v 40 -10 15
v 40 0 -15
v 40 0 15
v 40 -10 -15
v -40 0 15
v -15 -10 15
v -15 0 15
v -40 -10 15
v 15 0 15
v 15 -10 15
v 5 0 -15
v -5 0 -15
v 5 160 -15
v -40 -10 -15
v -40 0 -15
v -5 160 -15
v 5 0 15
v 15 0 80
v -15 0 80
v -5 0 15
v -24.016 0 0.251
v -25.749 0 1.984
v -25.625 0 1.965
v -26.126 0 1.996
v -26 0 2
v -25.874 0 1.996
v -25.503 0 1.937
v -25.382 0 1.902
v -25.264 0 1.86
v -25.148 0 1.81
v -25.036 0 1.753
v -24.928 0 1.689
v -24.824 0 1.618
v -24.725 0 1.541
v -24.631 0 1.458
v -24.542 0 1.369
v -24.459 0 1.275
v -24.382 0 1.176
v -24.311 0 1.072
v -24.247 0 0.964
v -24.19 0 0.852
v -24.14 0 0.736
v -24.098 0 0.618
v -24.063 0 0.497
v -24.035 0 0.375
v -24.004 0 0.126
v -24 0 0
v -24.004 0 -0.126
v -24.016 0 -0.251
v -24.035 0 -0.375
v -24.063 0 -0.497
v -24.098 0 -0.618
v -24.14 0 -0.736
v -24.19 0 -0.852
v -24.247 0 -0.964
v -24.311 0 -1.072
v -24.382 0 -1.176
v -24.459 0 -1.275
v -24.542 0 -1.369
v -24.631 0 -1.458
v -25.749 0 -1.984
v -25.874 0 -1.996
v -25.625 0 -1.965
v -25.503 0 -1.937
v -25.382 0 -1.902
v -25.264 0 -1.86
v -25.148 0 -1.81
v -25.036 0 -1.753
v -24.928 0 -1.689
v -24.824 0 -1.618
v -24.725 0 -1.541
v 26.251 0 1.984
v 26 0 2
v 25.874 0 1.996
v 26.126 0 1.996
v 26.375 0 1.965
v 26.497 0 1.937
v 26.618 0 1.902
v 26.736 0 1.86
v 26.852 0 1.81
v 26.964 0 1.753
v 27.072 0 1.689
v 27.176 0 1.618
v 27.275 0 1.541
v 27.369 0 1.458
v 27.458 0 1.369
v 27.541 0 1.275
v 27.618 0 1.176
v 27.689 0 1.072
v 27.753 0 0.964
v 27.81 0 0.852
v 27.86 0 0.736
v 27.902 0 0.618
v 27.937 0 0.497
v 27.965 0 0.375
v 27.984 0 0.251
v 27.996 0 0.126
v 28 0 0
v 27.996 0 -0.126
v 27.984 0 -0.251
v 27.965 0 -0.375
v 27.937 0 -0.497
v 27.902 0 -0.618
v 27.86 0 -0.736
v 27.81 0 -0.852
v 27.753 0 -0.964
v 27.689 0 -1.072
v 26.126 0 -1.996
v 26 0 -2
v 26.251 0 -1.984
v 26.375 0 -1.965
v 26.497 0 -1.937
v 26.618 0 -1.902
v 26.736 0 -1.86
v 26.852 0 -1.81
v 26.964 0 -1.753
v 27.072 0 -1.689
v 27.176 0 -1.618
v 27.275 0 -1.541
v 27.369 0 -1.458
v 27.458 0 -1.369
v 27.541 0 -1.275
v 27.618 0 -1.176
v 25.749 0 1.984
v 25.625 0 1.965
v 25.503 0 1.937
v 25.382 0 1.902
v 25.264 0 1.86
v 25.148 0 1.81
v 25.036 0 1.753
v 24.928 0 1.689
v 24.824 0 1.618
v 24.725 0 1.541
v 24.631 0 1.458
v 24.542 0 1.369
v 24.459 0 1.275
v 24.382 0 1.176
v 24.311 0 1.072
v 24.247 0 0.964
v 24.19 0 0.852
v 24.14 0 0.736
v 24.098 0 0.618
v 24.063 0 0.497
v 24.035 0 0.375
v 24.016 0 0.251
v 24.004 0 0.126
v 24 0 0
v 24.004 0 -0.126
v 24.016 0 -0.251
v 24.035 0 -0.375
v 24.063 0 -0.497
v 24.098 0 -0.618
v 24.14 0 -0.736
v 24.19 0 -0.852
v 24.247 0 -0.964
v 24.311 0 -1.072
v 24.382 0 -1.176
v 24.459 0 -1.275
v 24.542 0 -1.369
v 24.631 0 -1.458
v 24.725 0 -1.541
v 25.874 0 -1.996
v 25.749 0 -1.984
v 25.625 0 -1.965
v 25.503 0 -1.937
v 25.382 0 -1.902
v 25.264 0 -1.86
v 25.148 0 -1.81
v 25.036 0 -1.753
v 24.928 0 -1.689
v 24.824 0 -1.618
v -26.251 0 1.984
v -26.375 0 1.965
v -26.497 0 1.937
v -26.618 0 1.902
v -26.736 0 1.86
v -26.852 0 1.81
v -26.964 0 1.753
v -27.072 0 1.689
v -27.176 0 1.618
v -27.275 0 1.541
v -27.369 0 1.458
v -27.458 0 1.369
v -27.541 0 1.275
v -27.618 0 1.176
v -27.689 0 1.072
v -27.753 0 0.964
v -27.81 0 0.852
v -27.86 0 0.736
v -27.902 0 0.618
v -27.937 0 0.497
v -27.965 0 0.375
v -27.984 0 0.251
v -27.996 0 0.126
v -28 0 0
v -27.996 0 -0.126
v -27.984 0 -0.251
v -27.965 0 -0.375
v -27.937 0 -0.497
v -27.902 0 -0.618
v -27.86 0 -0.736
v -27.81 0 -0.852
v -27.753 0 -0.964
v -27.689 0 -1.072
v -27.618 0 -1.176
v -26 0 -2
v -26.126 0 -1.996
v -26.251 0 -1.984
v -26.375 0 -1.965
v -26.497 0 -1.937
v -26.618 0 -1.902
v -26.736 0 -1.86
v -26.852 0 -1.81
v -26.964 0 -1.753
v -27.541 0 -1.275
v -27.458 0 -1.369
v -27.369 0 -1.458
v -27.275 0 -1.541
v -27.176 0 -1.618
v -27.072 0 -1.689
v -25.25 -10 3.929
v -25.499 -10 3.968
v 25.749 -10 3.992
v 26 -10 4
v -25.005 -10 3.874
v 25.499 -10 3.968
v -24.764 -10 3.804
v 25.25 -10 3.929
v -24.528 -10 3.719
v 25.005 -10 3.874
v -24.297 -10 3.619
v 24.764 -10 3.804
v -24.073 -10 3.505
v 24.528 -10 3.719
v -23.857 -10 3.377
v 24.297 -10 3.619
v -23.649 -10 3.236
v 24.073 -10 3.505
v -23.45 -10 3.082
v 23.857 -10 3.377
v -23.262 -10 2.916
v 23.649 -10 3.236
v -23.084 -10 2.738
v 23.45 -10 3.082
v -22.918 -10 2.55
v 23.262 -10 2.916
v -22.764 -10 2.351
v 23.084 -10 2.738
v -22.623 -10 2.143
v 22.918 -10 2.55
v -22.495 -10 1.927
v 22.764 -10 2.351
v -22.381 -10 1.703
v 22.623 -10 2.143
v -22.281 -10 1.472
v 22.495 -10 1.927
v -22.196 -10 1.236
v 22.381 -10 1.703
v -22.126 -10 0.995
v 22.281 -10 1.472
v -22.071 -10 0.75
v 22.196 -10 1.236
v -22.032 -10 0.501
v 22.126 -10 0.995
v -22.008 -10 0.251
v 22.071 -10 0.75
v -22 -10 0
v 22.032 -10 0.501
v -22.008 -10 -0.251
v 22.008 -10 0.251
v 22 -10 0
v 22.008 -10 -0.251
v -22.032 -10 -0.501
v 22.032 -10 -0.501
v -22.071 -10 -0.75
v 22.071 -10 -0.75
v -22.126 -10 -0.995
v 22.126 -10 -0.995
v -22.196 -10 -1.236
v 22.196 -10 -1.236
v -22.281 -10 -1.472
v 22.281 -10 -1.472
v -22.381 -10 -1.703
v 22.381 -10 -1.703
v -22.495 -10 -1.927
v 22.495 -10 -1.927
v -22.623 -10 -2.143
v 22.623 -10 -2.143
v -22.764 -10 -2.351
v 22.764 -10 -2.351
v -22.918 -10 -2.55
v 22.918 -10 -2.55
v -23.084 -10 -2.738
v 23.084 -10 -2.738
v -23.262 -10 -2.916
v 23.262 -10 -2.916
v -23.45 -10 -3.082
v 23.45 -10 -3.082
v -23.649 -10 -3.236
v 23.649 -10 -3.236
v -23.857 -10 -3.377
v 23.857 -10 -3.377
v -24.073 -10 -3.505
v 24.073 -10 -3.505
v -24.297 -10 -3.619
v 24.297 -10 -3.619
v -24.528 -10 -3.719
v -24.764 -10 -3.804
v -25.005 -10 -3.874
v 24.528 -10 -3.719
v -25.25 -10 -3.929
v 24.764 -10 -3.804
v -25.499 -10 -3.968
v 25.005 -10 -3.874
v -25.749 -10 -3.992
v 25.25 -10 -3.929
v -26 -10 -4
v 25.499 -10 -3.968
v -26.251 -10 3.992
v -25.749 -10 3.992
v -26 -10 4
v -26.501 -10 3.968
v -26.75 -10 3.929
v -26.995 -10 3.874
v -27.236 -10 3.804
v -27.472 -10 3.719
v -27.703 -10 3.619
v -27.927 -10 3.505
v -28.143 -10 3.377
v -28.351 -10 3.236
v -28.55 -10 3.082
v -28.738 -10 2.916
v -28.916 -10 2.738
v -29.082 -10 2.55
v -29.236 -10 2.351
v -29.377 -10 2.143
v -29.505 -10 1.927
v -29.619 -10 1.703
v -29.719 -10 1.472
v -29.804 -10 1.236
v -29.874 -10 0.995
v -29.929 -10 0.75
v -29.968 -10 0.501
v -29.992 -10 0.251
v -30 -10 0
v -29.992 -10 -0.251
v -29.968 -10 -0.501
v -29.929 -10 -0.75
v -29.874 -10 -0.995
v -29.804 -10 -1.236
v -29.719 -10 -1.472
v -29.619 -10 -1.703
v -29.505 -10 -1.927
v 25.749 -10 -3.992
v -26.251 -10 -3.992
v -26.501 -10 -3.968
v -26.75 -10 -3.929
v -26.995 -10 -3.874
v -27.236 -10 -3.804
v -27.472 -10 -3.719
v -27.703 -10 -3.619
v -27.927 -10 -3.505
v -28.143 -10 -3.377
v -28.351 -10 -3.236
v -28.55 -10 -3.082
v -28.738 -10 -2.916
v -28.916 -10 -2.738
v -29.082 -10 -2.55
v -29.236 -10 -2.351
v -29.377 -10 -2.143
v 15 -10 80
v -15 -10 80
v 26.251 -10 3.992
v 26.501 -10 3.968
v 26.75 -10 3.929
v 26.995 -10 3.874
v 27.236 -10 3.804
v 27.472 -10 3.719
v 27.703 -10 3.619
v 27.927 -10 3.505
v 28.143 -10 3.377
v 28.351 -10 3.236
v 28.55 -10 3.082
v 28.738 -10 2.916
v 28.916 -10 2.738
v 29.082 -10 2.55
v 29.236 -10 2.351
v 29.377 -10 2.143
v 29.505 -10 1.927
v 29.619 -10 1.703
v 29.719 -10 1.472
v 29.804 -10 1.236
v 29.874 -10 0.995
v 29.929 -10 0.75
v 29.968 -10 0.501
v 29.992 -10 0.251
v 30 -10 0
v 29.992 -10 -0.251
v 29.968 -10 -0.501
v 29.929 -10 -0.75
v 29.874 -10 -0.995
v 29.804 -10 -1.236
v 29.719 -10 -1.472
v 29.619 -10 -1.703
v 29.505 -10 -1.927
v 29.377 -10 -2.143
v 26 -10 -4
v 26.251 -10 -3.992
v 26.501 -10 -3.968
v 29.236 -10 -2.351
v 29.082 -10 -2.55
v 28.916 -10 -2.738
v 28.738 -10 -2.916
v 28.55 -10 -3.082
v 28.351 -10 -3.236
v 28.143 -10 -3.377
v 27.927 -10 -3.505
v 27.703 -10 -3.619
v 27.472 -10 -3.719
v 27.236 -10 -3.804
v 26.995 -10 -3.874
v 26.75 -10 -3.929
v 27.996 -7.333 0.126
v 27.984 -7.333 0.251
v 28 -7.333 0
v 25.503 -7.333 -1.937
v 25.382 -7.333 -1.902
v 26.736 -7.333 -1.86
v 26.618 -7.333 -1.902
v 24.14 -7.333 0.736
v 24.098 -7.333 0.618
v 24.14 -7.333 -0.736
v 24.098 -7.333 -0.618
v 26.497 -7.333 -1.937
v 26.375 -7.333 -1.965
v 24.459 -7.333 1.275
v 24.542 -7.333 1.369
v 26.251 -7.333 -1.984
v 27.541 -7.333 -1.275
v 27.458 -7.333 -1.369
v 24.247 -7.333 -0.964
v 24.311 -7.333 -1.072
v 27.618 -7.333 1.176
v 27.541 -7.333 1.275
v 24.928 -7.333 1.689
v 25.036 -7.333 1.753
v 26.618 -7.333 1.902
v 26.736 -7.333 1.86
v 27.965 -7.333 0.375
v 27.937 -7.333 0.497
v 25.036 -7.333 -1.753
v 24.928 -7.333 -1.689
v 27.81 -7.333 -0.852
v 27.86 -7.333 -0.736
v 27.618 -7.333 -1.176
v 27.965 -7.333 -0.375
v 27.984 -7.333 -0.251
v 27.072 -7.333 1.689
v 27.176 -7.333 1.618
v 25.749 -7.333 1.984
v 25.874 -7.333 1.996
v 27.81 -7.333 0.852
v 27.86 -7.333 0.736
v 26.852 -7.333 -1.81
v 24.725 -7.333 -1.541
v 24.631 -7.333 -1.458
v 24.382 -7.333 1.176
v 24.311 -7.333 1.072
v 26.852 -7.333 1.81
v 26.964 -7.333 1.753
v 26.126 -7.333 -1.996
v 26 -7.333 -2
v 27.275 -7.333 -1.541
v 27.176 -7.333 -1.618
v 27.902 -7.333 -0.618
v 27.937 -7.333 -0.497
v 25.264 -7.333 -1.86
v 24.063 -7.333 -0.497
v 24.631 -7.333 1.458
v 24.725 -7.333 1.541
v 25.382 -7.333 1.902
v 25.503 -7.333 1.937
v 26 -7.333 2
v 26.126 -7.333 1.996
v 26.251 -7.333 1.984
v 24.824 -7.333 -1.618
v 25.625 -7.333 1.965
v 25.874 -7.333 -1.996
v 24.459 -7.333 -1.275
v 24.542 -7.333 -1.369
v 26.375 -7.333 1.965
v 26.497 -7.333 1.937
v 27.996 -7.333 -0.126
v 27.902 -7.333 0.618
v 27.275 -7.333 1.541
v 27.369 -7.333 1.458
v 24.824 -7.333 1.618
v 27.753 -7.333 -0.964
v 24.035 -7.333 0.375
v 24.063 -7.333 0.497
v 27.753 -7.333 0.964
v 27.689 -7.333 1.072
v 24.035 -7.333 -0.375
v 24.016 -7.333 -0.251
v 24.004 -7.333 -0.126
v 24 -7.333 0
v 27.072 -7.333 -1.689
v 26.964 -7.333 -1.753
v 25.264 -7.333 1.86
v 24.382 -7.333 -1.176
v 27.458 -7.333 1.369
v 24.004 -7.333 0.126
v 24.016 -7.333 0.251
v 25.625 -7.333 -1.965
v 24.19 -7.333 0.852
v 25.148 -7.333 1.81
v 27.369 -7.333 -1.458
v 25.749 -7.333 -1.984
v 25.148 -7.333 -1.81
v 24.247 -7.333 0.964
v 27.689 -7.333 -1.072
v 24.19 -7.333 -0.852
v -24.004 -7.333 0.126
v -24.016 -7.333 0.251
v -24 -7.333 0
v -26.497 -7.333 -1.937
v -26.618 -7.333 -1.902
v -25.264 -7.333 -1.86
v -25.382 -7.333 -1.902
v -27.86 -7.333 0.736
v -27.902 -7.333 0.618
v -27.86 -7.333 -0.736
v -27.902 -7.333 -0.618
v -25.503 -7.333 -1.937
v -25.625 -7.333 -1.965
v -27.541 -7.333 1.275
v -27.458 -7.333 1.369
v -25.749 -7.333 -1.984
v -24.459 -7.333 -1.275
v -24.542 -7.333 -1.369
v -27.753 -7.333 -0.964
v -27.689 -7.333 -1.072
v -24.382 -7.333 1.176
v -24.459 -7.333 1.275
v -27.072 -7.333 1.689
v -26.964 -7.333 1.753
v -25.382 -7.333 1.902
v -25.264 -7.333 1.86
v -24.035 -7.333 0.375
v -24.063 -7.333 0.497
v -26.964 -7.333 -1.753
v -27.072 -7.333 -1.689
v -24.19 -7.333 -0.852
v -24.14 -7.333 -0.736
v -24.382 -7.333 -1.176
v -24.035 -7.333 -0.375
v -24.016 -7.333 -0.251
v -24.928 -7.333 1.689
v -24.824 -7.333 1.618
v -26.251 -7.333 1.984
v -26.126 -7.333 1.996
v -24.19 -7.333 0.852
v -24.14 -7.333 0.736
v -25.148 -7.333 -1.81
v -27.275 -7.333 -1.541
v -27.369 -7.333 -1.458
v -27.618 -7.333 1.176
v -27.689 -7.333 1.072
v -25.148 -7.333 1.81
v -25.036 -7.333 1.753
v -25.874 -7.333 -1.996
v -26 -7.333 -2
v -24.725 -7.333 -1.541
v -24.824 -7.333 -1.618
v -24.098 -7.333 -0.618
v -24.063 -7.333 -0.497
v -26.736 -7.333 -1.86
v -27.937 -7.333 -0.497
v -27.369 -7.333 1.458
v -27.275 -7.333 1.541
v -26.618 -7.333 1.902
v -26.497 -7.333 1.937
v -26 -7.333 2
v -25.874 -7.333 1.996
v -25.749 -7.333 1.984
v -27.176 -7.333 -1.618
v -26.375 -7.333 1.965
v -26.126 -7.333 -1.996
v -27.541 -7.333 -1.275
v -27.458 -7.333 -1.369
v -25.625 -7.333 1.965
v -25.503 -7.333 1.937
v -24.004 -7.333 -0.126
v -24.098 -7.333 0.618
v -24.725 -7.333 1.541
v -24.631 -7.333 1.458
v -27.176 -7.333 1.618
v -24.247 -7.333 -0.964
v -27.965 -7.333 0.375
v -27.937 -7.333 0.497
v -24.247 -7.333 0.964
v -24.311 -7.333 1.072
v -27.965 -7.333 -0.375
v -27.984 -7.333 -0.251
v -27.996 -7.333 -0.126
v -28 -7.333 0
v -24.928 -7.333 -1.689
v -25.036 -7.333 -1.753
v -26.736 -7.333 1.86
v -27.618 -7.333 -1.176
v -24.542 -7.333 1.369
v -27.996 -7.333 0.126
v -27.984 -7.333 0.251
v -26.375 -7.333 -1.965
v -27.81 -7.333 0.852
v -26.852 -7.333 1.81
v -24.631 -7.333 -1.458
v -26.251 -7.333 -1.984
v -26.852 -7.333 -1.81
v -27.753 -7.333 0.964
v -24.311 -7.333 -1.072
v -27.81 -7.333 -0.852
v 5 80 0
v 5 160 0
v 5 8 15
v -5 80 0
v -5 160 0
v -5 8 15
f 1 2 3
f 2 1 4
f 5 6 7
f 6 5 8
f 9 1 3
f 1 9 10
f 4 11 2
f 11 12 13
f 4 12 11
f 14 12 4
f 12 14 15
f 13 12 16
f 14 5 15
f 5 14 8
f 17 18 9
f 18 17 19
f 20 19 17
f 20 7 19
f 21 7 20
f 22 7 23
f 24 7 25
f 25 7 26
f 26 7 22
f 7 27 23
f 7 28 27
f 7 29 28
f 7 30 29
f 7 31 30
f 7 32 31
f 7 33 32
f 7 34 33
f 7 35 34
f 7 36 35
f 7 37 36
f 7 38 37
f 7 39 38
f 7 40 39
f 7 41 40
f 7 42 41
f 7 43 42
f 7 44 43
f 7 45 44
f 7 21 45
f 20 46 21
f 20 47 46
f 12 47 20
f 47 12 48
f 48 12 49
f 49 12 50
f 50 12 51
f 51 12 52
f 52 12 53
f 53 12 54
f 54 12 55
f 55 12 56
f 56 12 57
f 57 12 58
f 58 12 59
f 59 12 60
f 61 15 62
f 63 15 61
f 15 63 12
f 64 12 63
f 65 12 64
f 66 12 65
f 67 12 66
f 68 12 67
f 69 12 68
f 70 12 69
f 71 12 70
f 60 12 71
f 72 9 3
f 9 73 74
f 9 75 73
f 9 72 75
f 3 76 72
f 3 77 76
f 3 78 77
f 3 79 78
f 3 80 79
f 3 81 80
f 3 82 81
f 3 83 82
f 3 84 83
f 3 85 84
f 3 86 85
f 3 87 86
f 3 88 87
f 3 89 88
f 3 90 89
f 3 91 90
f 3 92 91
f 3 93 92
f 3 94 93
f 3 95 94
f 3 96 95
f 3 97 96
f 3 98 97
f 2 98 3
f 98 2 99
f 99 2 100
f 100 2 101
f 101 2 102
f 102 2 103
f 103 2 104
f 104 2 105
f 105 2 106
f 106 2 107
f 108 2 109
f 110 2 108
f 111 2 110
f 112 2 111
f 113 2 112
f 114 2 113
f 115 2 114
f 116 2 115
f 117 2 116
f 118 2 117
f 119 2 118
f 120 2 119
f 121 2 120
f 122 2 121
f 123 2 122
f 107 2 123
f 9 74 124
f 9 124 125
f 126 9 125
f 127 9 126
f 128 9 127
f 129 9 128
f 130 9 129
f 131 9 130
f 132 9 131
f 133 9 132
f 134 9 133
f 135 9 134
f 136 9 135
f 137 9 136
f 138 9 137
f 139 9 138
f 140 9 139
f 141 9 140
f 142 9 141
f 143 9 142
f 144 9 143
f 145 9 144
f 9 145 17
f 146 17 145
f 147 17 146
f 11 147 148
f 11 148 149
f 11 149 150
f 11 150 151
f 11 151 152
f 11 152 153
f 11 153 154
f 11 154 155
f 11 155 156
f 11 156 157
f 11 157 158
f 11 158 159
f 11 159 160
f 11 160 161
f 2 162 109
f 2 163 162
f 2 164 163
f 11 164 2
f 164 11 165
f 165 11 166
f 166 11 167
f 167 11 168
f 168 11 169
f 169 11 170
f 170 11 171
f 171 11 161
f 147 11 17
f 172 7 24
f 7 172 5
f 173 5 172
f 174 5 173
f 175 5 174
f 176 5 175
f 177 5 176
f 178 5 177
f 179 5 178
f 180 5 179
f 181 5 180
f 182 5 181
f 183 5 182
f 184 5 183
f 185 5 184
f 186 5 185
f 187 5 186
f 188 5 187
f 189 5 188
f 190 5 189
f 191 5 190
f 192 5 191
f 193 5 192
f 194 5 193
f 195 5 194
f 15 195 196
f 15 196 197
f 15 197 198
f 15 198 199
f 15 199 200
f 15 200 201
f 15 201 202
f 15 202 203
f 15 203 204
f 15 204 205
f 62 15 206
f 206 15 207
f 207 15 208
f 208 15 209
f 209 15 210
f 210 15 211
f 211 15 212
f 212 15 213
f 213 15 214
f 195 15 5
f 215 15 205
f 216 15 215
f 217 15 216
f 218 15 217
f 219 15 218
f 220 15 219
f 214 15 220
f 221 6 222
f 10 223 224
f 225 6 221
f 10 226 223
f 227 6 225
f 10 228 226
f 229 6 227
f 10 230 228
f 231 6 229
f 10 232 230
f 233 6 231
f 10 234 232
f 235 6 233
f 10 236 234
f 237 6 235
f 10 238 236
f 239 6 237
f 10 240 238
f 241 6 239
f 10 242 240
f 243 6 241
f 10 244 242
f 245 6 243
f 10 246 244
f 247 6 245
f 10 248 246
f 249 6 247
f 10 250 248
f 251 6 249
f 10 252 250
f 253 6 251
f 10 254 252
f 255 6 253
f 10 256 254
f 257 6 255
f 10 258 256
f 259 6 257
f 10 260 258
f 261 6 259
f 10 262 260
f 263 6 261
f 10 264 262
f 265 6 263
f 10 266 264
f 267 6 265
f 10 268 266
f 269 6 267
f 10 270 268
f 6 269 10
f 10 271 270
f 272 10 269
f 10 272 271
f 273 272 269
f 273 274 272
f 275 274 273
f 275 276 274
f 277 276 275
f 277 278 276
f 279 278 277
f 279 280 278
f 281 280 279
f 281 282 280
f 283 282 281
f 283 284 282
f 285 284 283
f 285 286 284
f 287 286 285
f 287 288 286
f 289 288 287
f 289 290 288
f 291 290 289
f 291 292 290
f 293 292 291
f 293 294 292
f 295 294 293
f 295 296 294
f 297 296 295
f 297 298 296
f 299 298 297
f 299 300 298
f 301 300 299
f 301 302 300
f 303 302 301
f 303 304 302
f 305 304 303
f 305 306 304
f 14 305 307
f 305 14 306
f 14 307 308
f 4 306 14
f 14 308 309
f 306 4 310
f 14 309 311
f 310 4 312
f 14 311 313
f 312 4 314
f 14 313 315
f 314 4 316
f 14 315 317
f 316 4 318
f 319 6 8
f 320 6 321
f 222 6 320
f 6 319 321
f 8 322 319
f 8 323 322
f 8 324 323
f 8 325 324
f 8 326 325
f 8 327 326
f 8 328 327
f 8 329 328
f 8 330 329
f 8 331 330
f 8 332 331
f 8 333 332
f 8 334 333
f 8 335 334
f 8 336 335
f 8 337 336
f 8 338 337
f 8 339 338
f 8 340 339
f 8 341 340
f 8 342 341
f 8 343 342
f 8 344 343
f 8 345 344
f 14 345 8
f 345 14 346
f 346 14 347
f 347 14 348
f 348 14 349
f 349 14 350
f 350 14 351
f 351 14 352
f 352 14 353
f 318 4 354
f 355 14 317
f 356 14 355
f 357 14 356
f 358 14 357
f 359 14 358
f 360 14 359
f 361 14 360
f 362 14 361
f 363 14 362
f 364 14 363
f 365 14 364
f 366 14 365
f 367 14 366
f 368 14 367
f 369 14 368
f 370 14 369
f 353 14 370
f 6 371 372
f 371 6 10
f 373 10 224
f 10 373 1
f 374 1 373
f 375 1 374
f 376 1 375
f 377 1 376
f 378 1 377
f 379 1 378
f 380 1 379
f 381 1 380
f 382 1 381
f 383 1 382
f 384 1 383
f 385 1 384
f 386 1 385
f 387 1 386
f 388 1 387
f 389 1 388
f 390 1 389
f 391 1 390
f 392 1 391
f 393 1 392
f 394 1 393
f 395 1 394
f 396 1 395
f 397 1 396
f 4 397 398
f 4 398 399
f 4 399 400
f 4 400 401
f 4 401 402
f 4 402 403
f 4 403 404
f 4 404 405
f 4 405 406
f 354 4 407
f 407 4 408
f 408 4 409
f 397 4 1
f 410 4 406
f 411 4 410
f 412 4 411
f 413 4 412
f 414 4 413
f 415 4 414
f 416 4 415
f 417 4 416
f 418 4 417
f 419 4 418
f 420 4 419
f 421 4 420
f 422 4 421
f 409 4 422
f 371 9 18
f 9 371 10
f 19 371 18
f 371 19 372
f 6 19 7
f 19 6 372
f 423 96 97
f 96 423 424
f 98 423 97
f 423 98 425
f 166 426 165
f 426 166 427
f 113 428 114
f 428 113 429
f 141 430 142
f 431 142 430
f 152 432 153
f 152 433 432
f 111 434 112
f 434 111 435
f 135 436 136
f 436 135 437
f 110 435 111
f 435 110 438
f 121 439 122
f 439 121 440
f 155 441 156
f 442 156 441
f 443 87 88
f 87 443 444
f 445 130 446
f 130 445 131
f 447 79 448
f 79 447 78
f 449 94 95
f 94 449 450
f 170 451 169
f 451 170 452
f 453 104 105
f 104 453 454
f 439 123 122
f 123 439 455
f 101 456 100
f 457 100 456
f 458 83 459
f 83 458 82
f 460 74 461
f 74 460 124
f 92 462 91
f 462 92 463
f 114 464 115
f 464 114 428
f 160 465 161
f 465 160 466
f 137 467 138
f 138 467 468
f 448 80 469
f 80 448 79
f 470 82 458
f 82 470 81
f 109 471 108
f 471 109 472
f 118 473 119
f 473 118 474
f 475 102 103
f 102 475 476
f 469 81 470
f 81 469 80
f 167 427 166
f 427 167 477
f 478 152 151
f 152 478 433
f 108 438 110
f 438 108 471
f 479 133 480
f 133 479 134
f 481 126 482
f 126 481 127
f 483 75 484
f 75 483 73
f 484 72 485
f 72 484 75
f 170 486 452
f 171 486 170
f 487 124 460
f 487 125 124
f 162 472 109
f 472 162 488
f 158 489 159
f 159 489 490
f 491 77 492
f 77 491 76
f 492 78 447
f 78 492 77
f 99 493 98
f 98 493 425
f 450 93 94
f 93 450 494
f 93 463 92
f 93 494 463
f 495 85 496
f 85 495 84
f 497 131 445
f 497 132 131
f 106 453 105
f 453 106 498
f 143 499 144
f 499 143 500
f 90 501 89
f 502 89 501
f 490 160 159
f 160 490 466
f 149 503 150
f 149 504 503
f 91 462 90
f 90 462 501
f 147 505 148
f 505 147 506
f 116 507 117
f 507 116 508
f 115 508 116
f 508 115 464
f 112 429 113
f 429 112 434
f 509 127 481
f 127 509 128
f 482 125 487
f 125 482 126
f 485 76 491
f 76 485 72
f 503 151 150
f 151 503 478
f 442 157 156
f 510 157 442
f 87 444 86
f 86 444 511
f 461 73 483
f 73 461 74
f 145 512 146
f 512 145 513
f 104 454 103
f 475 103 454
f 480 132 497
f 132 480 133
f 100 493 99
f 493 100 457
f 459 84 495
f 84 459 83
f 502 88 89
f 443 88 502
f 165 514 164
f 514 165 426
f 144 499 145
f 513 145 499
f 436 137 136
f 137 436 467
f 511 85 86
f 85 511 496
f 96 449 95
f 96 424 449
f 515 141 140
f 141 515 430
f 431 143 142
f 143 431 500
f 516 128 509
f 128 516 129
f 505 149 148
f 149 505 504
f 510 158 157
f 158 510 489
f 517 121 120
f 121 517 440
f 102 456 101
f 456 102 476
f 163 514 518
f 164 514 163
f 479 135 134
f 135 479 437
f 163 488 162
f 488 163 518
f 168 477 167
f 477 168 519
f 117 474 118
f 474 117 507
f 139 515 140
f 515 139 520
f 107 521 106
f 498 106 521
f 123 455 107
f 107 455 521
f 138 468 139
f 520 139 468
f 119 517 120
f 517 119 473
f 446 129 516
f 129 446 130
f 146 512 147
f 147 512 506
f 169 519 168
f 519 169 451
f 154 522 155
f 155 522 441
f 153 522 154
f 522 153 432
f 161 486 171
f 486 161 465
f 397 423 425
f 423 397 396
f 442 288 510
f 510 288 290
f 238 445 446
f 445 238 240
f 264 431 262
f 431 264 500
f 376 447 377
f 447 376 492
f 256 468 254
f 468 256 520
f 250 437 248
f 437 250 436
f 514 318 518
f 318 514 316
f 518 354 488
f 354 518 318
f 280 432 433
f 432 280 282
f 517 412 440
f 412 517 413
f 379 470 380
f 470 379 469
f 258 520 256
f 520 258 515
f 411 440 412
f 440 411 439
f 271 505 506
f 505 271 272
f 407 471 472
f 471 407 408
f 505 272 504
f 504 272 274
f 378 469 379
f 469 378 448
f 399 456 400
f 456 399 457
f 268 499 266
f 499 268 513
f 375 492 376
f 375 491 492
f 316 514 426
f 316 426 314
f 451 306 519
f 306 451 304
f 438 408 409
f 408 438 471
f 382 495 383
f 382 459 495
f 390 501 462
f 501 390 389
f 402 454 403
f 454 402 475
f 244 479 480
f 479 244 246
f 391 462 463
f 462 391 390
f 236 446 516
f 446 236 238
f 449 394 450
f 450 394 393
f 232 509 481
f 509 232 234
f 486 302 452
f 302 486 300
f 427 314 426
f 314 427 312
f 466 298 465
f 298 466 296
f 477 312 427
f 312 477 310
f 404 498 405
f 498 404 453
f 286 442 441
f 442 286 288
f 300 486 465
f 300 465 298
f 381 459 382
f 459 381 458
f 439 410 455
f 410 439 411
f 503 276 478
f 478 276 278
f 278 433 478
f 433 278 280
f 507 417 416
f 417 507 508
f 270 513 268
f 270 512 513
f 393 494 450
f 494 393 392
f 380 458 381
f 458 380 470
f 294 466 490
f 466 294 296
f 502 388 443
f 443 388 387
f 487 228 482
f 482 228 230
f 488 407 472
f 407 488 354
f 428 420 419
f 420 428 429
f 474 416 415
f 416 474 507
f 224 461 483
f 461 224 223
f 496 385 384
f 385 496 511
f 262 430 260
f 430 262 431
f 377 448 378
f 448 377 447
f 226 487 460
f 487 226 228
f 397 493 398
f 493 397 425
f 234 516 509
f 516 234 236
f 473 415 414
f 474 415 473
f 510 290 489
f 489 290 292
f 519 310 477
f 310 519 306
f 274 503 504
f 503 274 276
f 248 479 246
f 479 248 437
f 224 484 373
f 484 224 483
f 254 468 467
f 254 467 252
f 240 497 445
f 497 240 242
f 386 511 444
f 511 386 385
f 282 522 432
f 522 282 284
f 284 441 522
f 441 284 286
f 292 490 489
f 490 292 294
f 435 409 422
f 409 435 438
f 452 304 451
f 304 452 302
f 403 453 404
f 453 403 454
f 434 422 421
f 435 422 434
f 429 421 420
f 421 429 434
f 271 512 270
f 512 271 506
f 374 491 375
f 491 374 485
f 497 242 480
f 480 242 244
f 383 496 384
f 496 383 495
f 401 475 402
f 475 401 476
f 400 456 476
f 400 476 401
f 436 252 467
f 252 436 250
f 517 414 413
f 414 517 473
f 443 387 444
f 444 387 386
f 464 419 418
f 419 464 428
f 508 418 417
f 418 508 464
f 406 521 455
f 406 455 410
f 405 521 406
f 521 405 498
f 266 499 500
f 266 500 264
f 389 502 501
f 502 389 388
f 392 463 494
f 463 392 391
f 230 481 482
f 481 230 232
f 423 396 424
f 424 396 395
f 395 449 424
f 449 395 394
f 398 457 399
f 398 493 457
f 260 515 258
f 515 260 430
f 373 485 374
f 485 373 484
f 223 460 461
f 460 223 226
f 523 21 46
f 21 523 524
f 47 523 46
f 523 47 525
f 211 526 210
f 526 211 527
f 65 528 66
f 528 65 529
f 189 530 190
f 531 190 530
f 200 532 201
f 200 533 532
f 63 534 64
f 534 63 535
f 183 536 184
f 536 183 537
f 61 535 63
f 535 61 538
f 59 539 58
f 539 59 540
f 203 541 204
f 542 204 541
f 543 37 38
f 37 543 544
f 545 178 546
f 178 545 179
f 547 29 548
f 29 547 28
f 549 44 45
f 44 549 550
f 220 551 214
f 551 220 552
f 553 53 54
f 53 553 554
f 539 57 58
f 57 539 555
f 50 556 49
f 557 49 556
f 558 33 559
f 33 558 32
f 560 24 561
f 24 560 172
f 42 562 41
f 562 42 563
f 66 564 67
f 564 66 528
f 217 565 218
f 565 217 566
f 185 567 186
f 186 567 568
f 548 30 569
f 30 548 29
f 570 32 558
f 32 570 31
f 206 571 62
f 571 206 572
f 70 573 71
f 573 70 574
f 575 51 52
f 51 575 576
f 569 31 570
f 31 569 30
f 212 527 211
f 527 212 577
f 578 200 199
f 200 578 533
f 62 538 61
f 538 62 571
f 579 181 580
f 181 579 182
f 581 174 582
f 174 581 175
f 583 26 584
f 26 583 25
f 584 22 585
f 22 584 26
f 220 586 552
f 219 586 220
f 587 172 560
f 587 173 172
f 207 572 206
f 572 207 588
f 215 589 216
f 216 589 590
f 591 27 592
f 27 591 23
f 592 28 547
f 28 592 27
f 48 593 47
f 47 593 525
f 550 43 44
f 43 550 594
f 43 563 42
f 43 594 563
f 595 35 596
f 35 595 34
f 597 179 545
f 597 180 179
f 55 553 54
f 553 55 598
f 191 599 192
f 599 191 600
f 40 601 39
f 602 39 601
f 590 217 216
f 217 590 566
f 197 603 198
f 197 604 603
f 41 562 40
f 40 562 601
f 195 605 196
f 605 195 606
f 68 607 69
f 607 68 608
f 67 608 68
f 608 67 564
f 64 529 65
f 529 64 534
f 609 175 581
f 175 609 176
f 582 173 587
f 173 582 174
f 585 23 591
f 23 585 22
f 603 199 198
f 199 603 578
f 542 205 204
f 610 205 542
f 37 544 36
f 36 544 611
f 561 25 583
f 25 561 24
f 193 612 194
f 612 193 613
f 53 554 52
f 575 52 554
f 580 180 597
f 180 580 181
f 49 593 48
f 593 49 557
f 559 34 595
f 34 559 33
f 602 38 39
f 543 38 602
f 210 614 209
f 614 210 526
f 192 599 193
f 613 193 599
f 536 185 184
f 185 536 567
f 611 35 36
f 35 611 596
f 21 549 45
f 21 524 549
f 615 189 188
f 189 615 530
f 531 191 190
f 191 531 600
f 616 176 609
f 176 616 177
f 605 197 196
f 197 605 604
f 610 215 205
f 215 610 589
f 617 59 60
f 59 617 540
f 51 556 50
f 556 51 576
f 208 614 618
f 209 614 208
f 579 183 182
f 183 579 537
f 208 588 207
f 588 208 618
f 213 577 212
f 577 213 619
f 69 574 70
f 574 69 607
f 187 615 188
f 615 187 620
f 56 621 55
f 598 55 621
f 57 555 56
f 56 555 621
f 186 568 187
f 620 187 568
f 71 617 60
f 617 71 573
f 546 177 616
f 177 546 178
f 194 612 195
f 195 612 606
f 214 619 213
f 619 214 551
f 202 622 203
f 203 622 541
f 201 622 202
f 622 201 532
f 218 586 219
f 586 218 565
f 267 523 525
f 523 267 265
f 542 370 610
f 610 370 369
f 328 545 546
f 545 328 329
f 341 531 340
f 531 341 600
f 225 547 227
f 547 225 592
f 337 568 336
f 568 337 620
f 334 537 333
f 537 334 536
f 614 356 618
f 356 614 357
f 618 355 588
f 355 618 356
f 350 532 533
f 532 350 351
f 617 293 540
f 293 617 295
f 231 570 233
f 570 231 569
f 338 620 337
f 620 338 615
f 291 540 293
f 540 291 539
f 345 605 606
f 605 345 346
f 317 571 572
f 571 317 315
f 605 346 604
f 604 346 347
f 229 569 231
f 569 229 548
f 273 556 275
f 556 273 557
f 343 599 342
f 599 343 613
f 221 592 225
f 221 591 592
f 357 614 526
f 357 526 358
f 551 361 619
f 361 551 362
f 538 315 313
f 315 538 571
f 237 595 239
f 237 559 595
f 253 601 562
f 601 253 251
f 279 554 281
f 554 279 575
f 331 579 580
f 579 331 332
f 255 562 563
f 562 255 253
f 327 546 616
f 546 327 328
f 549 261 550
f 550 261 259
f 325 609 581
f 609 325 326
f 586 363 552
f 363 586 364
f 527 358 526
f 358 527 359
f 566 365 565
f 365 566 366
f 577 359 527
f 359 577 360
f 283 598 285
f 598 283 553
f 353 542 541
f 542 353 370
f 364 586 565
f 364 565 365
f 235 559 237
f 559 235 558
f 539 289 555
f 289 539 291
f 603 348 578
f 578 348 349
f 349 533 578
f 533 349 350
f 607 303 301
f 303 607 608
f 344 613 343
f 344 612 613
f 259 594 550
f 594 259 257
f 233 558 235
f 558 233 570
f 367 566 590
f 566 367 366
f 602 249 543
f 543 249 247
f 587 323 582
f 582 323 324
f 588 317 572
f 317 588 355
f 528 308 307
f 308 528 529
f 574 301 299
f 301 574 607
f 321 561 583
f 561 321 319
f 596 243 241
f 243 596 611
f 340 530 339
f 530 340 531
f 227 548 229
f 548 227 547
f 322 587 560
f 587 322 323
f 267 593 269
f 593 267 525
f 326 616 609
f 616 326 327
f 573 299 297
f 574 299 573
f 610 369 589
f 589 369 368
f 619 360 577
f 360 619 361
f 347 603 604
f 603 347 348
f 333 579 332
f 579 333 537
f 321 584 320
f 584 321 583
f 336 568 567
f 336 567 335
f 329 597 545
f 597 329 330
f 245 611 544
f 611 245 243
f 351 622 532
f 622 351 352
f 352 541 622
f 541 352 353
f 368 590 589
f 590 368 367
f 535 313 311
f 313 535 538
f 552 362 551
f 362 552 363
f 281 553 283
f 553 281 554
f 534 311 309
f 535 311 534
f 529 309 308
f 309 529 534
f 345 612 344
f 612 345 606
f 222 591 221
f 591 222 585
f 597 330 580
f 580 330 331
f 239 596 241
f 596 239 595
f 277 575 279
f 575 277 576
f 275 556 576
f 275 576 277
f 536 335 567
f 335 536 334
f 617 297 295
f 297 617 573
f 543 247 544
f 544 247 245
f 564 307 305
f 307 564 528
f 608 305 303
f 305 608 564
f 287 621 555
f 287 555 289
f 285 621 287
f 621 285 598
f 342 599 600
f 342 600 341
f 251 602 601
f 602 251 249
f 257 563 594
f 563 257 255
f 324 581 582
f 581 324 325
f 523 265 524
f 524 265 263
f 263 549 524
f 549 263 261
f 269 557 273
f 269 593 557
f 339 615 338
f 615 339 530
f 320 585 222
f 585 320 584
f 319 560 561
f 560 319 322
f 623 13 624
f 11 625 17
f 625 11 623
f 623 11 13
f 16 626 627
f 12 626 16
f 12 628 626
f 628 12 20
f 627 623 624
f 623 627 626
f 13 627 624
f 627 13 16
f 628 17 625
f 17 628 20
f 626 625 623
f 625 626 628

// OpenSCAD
$fn=100;

thickness=10;
wall_dist=150+thickness;
width=80;
width2=100;
height=30;

screw_dia=4;
screw_dia2=5;
screw_head=8;
screw_offs=width/4*1.3;

screw_dist=76;

back=3;

module screwhole()
{
  cylinder(d=screw_dia, h=thickness+1, center=true);
  translate([0, 0, thickness/2]) mirror([0, 0, 1]) cylinder(d2=0, d1=screw_head, h=screw_head*2/3, center=false);
}

module screwhole2()
{
  cylinder(d=screw_dia2, h=thickness+1, center=true);
  //translate([0, 0, thickness/2]) mirror([0, 0, 1]) cylinder(d2=0, d1=screw_head, h=screw_head*2/3, center=false);
}


//   FALI TARTO
translate([0, -thickness/2], 0) difference()
{
  union()
  {
    cube([width, thickness, height], center=true);
    translate([0, 0, width/2]) cube([height, thickness, width], center=true);
  }
  translate([screw_offs, 0, 0]) rotate([90, 0, 0]) screwhole();
  translate([-screw_offs, 0, 0]) rotate([90, 0, 0]) screwhole();
}

//   SZEKRENYHEZ ROGZITHETO
//rotate([0, 0, 45])
//{
//  difference()
//  {
//    union()
//    {
//      translate([70/2+thickness/2, 0, 0]) cube([70, thickness, height], center=true);
//      //translate([50/2+thickness/2, 0, 10]) cube([50, thickness, height], center=true);
//      //cylinder(d=thickness, h=height, center=true);
//    }
//    translate([50+thickness/2, 0, 0]) rotate([90, 0, 0]) screwhole2();
//  }
//  translate([0, 18.8/2+thickness/2, 0]) cube([thickness, 18.8+thickness*2, height], center=true);
//  #translate([back/2+thickness/2, 18.8+thickness, 0]) cube([back, thickness, height], center=true);
//}

//difference()
//{
//  #translate([0, -wall_dist/2, 0]) cube([thickness, wall_dist, height], center=true);
//
//}

translate([0, 0, height/2])
  rotate([-90, 0, 90])
    linear_extrude(height=thickness, center=true)
      polygon(points=[[0, height], [0, 0], [8, 0], [80, height/2], [160, height/2], [160, height]]);

//translate([0, -wall_dist+thickness/2, 0]) difference()
//{
//  cube([width2, thickness, height], center=true);
//  translate([screw_dist/2, 0, 0]) rotate([-90, 0, 0]) screwhole2();
//  translate([-screw_dist/2, 0, 0]) rotate([-90, 0, 0]) screwhole2();
//}
